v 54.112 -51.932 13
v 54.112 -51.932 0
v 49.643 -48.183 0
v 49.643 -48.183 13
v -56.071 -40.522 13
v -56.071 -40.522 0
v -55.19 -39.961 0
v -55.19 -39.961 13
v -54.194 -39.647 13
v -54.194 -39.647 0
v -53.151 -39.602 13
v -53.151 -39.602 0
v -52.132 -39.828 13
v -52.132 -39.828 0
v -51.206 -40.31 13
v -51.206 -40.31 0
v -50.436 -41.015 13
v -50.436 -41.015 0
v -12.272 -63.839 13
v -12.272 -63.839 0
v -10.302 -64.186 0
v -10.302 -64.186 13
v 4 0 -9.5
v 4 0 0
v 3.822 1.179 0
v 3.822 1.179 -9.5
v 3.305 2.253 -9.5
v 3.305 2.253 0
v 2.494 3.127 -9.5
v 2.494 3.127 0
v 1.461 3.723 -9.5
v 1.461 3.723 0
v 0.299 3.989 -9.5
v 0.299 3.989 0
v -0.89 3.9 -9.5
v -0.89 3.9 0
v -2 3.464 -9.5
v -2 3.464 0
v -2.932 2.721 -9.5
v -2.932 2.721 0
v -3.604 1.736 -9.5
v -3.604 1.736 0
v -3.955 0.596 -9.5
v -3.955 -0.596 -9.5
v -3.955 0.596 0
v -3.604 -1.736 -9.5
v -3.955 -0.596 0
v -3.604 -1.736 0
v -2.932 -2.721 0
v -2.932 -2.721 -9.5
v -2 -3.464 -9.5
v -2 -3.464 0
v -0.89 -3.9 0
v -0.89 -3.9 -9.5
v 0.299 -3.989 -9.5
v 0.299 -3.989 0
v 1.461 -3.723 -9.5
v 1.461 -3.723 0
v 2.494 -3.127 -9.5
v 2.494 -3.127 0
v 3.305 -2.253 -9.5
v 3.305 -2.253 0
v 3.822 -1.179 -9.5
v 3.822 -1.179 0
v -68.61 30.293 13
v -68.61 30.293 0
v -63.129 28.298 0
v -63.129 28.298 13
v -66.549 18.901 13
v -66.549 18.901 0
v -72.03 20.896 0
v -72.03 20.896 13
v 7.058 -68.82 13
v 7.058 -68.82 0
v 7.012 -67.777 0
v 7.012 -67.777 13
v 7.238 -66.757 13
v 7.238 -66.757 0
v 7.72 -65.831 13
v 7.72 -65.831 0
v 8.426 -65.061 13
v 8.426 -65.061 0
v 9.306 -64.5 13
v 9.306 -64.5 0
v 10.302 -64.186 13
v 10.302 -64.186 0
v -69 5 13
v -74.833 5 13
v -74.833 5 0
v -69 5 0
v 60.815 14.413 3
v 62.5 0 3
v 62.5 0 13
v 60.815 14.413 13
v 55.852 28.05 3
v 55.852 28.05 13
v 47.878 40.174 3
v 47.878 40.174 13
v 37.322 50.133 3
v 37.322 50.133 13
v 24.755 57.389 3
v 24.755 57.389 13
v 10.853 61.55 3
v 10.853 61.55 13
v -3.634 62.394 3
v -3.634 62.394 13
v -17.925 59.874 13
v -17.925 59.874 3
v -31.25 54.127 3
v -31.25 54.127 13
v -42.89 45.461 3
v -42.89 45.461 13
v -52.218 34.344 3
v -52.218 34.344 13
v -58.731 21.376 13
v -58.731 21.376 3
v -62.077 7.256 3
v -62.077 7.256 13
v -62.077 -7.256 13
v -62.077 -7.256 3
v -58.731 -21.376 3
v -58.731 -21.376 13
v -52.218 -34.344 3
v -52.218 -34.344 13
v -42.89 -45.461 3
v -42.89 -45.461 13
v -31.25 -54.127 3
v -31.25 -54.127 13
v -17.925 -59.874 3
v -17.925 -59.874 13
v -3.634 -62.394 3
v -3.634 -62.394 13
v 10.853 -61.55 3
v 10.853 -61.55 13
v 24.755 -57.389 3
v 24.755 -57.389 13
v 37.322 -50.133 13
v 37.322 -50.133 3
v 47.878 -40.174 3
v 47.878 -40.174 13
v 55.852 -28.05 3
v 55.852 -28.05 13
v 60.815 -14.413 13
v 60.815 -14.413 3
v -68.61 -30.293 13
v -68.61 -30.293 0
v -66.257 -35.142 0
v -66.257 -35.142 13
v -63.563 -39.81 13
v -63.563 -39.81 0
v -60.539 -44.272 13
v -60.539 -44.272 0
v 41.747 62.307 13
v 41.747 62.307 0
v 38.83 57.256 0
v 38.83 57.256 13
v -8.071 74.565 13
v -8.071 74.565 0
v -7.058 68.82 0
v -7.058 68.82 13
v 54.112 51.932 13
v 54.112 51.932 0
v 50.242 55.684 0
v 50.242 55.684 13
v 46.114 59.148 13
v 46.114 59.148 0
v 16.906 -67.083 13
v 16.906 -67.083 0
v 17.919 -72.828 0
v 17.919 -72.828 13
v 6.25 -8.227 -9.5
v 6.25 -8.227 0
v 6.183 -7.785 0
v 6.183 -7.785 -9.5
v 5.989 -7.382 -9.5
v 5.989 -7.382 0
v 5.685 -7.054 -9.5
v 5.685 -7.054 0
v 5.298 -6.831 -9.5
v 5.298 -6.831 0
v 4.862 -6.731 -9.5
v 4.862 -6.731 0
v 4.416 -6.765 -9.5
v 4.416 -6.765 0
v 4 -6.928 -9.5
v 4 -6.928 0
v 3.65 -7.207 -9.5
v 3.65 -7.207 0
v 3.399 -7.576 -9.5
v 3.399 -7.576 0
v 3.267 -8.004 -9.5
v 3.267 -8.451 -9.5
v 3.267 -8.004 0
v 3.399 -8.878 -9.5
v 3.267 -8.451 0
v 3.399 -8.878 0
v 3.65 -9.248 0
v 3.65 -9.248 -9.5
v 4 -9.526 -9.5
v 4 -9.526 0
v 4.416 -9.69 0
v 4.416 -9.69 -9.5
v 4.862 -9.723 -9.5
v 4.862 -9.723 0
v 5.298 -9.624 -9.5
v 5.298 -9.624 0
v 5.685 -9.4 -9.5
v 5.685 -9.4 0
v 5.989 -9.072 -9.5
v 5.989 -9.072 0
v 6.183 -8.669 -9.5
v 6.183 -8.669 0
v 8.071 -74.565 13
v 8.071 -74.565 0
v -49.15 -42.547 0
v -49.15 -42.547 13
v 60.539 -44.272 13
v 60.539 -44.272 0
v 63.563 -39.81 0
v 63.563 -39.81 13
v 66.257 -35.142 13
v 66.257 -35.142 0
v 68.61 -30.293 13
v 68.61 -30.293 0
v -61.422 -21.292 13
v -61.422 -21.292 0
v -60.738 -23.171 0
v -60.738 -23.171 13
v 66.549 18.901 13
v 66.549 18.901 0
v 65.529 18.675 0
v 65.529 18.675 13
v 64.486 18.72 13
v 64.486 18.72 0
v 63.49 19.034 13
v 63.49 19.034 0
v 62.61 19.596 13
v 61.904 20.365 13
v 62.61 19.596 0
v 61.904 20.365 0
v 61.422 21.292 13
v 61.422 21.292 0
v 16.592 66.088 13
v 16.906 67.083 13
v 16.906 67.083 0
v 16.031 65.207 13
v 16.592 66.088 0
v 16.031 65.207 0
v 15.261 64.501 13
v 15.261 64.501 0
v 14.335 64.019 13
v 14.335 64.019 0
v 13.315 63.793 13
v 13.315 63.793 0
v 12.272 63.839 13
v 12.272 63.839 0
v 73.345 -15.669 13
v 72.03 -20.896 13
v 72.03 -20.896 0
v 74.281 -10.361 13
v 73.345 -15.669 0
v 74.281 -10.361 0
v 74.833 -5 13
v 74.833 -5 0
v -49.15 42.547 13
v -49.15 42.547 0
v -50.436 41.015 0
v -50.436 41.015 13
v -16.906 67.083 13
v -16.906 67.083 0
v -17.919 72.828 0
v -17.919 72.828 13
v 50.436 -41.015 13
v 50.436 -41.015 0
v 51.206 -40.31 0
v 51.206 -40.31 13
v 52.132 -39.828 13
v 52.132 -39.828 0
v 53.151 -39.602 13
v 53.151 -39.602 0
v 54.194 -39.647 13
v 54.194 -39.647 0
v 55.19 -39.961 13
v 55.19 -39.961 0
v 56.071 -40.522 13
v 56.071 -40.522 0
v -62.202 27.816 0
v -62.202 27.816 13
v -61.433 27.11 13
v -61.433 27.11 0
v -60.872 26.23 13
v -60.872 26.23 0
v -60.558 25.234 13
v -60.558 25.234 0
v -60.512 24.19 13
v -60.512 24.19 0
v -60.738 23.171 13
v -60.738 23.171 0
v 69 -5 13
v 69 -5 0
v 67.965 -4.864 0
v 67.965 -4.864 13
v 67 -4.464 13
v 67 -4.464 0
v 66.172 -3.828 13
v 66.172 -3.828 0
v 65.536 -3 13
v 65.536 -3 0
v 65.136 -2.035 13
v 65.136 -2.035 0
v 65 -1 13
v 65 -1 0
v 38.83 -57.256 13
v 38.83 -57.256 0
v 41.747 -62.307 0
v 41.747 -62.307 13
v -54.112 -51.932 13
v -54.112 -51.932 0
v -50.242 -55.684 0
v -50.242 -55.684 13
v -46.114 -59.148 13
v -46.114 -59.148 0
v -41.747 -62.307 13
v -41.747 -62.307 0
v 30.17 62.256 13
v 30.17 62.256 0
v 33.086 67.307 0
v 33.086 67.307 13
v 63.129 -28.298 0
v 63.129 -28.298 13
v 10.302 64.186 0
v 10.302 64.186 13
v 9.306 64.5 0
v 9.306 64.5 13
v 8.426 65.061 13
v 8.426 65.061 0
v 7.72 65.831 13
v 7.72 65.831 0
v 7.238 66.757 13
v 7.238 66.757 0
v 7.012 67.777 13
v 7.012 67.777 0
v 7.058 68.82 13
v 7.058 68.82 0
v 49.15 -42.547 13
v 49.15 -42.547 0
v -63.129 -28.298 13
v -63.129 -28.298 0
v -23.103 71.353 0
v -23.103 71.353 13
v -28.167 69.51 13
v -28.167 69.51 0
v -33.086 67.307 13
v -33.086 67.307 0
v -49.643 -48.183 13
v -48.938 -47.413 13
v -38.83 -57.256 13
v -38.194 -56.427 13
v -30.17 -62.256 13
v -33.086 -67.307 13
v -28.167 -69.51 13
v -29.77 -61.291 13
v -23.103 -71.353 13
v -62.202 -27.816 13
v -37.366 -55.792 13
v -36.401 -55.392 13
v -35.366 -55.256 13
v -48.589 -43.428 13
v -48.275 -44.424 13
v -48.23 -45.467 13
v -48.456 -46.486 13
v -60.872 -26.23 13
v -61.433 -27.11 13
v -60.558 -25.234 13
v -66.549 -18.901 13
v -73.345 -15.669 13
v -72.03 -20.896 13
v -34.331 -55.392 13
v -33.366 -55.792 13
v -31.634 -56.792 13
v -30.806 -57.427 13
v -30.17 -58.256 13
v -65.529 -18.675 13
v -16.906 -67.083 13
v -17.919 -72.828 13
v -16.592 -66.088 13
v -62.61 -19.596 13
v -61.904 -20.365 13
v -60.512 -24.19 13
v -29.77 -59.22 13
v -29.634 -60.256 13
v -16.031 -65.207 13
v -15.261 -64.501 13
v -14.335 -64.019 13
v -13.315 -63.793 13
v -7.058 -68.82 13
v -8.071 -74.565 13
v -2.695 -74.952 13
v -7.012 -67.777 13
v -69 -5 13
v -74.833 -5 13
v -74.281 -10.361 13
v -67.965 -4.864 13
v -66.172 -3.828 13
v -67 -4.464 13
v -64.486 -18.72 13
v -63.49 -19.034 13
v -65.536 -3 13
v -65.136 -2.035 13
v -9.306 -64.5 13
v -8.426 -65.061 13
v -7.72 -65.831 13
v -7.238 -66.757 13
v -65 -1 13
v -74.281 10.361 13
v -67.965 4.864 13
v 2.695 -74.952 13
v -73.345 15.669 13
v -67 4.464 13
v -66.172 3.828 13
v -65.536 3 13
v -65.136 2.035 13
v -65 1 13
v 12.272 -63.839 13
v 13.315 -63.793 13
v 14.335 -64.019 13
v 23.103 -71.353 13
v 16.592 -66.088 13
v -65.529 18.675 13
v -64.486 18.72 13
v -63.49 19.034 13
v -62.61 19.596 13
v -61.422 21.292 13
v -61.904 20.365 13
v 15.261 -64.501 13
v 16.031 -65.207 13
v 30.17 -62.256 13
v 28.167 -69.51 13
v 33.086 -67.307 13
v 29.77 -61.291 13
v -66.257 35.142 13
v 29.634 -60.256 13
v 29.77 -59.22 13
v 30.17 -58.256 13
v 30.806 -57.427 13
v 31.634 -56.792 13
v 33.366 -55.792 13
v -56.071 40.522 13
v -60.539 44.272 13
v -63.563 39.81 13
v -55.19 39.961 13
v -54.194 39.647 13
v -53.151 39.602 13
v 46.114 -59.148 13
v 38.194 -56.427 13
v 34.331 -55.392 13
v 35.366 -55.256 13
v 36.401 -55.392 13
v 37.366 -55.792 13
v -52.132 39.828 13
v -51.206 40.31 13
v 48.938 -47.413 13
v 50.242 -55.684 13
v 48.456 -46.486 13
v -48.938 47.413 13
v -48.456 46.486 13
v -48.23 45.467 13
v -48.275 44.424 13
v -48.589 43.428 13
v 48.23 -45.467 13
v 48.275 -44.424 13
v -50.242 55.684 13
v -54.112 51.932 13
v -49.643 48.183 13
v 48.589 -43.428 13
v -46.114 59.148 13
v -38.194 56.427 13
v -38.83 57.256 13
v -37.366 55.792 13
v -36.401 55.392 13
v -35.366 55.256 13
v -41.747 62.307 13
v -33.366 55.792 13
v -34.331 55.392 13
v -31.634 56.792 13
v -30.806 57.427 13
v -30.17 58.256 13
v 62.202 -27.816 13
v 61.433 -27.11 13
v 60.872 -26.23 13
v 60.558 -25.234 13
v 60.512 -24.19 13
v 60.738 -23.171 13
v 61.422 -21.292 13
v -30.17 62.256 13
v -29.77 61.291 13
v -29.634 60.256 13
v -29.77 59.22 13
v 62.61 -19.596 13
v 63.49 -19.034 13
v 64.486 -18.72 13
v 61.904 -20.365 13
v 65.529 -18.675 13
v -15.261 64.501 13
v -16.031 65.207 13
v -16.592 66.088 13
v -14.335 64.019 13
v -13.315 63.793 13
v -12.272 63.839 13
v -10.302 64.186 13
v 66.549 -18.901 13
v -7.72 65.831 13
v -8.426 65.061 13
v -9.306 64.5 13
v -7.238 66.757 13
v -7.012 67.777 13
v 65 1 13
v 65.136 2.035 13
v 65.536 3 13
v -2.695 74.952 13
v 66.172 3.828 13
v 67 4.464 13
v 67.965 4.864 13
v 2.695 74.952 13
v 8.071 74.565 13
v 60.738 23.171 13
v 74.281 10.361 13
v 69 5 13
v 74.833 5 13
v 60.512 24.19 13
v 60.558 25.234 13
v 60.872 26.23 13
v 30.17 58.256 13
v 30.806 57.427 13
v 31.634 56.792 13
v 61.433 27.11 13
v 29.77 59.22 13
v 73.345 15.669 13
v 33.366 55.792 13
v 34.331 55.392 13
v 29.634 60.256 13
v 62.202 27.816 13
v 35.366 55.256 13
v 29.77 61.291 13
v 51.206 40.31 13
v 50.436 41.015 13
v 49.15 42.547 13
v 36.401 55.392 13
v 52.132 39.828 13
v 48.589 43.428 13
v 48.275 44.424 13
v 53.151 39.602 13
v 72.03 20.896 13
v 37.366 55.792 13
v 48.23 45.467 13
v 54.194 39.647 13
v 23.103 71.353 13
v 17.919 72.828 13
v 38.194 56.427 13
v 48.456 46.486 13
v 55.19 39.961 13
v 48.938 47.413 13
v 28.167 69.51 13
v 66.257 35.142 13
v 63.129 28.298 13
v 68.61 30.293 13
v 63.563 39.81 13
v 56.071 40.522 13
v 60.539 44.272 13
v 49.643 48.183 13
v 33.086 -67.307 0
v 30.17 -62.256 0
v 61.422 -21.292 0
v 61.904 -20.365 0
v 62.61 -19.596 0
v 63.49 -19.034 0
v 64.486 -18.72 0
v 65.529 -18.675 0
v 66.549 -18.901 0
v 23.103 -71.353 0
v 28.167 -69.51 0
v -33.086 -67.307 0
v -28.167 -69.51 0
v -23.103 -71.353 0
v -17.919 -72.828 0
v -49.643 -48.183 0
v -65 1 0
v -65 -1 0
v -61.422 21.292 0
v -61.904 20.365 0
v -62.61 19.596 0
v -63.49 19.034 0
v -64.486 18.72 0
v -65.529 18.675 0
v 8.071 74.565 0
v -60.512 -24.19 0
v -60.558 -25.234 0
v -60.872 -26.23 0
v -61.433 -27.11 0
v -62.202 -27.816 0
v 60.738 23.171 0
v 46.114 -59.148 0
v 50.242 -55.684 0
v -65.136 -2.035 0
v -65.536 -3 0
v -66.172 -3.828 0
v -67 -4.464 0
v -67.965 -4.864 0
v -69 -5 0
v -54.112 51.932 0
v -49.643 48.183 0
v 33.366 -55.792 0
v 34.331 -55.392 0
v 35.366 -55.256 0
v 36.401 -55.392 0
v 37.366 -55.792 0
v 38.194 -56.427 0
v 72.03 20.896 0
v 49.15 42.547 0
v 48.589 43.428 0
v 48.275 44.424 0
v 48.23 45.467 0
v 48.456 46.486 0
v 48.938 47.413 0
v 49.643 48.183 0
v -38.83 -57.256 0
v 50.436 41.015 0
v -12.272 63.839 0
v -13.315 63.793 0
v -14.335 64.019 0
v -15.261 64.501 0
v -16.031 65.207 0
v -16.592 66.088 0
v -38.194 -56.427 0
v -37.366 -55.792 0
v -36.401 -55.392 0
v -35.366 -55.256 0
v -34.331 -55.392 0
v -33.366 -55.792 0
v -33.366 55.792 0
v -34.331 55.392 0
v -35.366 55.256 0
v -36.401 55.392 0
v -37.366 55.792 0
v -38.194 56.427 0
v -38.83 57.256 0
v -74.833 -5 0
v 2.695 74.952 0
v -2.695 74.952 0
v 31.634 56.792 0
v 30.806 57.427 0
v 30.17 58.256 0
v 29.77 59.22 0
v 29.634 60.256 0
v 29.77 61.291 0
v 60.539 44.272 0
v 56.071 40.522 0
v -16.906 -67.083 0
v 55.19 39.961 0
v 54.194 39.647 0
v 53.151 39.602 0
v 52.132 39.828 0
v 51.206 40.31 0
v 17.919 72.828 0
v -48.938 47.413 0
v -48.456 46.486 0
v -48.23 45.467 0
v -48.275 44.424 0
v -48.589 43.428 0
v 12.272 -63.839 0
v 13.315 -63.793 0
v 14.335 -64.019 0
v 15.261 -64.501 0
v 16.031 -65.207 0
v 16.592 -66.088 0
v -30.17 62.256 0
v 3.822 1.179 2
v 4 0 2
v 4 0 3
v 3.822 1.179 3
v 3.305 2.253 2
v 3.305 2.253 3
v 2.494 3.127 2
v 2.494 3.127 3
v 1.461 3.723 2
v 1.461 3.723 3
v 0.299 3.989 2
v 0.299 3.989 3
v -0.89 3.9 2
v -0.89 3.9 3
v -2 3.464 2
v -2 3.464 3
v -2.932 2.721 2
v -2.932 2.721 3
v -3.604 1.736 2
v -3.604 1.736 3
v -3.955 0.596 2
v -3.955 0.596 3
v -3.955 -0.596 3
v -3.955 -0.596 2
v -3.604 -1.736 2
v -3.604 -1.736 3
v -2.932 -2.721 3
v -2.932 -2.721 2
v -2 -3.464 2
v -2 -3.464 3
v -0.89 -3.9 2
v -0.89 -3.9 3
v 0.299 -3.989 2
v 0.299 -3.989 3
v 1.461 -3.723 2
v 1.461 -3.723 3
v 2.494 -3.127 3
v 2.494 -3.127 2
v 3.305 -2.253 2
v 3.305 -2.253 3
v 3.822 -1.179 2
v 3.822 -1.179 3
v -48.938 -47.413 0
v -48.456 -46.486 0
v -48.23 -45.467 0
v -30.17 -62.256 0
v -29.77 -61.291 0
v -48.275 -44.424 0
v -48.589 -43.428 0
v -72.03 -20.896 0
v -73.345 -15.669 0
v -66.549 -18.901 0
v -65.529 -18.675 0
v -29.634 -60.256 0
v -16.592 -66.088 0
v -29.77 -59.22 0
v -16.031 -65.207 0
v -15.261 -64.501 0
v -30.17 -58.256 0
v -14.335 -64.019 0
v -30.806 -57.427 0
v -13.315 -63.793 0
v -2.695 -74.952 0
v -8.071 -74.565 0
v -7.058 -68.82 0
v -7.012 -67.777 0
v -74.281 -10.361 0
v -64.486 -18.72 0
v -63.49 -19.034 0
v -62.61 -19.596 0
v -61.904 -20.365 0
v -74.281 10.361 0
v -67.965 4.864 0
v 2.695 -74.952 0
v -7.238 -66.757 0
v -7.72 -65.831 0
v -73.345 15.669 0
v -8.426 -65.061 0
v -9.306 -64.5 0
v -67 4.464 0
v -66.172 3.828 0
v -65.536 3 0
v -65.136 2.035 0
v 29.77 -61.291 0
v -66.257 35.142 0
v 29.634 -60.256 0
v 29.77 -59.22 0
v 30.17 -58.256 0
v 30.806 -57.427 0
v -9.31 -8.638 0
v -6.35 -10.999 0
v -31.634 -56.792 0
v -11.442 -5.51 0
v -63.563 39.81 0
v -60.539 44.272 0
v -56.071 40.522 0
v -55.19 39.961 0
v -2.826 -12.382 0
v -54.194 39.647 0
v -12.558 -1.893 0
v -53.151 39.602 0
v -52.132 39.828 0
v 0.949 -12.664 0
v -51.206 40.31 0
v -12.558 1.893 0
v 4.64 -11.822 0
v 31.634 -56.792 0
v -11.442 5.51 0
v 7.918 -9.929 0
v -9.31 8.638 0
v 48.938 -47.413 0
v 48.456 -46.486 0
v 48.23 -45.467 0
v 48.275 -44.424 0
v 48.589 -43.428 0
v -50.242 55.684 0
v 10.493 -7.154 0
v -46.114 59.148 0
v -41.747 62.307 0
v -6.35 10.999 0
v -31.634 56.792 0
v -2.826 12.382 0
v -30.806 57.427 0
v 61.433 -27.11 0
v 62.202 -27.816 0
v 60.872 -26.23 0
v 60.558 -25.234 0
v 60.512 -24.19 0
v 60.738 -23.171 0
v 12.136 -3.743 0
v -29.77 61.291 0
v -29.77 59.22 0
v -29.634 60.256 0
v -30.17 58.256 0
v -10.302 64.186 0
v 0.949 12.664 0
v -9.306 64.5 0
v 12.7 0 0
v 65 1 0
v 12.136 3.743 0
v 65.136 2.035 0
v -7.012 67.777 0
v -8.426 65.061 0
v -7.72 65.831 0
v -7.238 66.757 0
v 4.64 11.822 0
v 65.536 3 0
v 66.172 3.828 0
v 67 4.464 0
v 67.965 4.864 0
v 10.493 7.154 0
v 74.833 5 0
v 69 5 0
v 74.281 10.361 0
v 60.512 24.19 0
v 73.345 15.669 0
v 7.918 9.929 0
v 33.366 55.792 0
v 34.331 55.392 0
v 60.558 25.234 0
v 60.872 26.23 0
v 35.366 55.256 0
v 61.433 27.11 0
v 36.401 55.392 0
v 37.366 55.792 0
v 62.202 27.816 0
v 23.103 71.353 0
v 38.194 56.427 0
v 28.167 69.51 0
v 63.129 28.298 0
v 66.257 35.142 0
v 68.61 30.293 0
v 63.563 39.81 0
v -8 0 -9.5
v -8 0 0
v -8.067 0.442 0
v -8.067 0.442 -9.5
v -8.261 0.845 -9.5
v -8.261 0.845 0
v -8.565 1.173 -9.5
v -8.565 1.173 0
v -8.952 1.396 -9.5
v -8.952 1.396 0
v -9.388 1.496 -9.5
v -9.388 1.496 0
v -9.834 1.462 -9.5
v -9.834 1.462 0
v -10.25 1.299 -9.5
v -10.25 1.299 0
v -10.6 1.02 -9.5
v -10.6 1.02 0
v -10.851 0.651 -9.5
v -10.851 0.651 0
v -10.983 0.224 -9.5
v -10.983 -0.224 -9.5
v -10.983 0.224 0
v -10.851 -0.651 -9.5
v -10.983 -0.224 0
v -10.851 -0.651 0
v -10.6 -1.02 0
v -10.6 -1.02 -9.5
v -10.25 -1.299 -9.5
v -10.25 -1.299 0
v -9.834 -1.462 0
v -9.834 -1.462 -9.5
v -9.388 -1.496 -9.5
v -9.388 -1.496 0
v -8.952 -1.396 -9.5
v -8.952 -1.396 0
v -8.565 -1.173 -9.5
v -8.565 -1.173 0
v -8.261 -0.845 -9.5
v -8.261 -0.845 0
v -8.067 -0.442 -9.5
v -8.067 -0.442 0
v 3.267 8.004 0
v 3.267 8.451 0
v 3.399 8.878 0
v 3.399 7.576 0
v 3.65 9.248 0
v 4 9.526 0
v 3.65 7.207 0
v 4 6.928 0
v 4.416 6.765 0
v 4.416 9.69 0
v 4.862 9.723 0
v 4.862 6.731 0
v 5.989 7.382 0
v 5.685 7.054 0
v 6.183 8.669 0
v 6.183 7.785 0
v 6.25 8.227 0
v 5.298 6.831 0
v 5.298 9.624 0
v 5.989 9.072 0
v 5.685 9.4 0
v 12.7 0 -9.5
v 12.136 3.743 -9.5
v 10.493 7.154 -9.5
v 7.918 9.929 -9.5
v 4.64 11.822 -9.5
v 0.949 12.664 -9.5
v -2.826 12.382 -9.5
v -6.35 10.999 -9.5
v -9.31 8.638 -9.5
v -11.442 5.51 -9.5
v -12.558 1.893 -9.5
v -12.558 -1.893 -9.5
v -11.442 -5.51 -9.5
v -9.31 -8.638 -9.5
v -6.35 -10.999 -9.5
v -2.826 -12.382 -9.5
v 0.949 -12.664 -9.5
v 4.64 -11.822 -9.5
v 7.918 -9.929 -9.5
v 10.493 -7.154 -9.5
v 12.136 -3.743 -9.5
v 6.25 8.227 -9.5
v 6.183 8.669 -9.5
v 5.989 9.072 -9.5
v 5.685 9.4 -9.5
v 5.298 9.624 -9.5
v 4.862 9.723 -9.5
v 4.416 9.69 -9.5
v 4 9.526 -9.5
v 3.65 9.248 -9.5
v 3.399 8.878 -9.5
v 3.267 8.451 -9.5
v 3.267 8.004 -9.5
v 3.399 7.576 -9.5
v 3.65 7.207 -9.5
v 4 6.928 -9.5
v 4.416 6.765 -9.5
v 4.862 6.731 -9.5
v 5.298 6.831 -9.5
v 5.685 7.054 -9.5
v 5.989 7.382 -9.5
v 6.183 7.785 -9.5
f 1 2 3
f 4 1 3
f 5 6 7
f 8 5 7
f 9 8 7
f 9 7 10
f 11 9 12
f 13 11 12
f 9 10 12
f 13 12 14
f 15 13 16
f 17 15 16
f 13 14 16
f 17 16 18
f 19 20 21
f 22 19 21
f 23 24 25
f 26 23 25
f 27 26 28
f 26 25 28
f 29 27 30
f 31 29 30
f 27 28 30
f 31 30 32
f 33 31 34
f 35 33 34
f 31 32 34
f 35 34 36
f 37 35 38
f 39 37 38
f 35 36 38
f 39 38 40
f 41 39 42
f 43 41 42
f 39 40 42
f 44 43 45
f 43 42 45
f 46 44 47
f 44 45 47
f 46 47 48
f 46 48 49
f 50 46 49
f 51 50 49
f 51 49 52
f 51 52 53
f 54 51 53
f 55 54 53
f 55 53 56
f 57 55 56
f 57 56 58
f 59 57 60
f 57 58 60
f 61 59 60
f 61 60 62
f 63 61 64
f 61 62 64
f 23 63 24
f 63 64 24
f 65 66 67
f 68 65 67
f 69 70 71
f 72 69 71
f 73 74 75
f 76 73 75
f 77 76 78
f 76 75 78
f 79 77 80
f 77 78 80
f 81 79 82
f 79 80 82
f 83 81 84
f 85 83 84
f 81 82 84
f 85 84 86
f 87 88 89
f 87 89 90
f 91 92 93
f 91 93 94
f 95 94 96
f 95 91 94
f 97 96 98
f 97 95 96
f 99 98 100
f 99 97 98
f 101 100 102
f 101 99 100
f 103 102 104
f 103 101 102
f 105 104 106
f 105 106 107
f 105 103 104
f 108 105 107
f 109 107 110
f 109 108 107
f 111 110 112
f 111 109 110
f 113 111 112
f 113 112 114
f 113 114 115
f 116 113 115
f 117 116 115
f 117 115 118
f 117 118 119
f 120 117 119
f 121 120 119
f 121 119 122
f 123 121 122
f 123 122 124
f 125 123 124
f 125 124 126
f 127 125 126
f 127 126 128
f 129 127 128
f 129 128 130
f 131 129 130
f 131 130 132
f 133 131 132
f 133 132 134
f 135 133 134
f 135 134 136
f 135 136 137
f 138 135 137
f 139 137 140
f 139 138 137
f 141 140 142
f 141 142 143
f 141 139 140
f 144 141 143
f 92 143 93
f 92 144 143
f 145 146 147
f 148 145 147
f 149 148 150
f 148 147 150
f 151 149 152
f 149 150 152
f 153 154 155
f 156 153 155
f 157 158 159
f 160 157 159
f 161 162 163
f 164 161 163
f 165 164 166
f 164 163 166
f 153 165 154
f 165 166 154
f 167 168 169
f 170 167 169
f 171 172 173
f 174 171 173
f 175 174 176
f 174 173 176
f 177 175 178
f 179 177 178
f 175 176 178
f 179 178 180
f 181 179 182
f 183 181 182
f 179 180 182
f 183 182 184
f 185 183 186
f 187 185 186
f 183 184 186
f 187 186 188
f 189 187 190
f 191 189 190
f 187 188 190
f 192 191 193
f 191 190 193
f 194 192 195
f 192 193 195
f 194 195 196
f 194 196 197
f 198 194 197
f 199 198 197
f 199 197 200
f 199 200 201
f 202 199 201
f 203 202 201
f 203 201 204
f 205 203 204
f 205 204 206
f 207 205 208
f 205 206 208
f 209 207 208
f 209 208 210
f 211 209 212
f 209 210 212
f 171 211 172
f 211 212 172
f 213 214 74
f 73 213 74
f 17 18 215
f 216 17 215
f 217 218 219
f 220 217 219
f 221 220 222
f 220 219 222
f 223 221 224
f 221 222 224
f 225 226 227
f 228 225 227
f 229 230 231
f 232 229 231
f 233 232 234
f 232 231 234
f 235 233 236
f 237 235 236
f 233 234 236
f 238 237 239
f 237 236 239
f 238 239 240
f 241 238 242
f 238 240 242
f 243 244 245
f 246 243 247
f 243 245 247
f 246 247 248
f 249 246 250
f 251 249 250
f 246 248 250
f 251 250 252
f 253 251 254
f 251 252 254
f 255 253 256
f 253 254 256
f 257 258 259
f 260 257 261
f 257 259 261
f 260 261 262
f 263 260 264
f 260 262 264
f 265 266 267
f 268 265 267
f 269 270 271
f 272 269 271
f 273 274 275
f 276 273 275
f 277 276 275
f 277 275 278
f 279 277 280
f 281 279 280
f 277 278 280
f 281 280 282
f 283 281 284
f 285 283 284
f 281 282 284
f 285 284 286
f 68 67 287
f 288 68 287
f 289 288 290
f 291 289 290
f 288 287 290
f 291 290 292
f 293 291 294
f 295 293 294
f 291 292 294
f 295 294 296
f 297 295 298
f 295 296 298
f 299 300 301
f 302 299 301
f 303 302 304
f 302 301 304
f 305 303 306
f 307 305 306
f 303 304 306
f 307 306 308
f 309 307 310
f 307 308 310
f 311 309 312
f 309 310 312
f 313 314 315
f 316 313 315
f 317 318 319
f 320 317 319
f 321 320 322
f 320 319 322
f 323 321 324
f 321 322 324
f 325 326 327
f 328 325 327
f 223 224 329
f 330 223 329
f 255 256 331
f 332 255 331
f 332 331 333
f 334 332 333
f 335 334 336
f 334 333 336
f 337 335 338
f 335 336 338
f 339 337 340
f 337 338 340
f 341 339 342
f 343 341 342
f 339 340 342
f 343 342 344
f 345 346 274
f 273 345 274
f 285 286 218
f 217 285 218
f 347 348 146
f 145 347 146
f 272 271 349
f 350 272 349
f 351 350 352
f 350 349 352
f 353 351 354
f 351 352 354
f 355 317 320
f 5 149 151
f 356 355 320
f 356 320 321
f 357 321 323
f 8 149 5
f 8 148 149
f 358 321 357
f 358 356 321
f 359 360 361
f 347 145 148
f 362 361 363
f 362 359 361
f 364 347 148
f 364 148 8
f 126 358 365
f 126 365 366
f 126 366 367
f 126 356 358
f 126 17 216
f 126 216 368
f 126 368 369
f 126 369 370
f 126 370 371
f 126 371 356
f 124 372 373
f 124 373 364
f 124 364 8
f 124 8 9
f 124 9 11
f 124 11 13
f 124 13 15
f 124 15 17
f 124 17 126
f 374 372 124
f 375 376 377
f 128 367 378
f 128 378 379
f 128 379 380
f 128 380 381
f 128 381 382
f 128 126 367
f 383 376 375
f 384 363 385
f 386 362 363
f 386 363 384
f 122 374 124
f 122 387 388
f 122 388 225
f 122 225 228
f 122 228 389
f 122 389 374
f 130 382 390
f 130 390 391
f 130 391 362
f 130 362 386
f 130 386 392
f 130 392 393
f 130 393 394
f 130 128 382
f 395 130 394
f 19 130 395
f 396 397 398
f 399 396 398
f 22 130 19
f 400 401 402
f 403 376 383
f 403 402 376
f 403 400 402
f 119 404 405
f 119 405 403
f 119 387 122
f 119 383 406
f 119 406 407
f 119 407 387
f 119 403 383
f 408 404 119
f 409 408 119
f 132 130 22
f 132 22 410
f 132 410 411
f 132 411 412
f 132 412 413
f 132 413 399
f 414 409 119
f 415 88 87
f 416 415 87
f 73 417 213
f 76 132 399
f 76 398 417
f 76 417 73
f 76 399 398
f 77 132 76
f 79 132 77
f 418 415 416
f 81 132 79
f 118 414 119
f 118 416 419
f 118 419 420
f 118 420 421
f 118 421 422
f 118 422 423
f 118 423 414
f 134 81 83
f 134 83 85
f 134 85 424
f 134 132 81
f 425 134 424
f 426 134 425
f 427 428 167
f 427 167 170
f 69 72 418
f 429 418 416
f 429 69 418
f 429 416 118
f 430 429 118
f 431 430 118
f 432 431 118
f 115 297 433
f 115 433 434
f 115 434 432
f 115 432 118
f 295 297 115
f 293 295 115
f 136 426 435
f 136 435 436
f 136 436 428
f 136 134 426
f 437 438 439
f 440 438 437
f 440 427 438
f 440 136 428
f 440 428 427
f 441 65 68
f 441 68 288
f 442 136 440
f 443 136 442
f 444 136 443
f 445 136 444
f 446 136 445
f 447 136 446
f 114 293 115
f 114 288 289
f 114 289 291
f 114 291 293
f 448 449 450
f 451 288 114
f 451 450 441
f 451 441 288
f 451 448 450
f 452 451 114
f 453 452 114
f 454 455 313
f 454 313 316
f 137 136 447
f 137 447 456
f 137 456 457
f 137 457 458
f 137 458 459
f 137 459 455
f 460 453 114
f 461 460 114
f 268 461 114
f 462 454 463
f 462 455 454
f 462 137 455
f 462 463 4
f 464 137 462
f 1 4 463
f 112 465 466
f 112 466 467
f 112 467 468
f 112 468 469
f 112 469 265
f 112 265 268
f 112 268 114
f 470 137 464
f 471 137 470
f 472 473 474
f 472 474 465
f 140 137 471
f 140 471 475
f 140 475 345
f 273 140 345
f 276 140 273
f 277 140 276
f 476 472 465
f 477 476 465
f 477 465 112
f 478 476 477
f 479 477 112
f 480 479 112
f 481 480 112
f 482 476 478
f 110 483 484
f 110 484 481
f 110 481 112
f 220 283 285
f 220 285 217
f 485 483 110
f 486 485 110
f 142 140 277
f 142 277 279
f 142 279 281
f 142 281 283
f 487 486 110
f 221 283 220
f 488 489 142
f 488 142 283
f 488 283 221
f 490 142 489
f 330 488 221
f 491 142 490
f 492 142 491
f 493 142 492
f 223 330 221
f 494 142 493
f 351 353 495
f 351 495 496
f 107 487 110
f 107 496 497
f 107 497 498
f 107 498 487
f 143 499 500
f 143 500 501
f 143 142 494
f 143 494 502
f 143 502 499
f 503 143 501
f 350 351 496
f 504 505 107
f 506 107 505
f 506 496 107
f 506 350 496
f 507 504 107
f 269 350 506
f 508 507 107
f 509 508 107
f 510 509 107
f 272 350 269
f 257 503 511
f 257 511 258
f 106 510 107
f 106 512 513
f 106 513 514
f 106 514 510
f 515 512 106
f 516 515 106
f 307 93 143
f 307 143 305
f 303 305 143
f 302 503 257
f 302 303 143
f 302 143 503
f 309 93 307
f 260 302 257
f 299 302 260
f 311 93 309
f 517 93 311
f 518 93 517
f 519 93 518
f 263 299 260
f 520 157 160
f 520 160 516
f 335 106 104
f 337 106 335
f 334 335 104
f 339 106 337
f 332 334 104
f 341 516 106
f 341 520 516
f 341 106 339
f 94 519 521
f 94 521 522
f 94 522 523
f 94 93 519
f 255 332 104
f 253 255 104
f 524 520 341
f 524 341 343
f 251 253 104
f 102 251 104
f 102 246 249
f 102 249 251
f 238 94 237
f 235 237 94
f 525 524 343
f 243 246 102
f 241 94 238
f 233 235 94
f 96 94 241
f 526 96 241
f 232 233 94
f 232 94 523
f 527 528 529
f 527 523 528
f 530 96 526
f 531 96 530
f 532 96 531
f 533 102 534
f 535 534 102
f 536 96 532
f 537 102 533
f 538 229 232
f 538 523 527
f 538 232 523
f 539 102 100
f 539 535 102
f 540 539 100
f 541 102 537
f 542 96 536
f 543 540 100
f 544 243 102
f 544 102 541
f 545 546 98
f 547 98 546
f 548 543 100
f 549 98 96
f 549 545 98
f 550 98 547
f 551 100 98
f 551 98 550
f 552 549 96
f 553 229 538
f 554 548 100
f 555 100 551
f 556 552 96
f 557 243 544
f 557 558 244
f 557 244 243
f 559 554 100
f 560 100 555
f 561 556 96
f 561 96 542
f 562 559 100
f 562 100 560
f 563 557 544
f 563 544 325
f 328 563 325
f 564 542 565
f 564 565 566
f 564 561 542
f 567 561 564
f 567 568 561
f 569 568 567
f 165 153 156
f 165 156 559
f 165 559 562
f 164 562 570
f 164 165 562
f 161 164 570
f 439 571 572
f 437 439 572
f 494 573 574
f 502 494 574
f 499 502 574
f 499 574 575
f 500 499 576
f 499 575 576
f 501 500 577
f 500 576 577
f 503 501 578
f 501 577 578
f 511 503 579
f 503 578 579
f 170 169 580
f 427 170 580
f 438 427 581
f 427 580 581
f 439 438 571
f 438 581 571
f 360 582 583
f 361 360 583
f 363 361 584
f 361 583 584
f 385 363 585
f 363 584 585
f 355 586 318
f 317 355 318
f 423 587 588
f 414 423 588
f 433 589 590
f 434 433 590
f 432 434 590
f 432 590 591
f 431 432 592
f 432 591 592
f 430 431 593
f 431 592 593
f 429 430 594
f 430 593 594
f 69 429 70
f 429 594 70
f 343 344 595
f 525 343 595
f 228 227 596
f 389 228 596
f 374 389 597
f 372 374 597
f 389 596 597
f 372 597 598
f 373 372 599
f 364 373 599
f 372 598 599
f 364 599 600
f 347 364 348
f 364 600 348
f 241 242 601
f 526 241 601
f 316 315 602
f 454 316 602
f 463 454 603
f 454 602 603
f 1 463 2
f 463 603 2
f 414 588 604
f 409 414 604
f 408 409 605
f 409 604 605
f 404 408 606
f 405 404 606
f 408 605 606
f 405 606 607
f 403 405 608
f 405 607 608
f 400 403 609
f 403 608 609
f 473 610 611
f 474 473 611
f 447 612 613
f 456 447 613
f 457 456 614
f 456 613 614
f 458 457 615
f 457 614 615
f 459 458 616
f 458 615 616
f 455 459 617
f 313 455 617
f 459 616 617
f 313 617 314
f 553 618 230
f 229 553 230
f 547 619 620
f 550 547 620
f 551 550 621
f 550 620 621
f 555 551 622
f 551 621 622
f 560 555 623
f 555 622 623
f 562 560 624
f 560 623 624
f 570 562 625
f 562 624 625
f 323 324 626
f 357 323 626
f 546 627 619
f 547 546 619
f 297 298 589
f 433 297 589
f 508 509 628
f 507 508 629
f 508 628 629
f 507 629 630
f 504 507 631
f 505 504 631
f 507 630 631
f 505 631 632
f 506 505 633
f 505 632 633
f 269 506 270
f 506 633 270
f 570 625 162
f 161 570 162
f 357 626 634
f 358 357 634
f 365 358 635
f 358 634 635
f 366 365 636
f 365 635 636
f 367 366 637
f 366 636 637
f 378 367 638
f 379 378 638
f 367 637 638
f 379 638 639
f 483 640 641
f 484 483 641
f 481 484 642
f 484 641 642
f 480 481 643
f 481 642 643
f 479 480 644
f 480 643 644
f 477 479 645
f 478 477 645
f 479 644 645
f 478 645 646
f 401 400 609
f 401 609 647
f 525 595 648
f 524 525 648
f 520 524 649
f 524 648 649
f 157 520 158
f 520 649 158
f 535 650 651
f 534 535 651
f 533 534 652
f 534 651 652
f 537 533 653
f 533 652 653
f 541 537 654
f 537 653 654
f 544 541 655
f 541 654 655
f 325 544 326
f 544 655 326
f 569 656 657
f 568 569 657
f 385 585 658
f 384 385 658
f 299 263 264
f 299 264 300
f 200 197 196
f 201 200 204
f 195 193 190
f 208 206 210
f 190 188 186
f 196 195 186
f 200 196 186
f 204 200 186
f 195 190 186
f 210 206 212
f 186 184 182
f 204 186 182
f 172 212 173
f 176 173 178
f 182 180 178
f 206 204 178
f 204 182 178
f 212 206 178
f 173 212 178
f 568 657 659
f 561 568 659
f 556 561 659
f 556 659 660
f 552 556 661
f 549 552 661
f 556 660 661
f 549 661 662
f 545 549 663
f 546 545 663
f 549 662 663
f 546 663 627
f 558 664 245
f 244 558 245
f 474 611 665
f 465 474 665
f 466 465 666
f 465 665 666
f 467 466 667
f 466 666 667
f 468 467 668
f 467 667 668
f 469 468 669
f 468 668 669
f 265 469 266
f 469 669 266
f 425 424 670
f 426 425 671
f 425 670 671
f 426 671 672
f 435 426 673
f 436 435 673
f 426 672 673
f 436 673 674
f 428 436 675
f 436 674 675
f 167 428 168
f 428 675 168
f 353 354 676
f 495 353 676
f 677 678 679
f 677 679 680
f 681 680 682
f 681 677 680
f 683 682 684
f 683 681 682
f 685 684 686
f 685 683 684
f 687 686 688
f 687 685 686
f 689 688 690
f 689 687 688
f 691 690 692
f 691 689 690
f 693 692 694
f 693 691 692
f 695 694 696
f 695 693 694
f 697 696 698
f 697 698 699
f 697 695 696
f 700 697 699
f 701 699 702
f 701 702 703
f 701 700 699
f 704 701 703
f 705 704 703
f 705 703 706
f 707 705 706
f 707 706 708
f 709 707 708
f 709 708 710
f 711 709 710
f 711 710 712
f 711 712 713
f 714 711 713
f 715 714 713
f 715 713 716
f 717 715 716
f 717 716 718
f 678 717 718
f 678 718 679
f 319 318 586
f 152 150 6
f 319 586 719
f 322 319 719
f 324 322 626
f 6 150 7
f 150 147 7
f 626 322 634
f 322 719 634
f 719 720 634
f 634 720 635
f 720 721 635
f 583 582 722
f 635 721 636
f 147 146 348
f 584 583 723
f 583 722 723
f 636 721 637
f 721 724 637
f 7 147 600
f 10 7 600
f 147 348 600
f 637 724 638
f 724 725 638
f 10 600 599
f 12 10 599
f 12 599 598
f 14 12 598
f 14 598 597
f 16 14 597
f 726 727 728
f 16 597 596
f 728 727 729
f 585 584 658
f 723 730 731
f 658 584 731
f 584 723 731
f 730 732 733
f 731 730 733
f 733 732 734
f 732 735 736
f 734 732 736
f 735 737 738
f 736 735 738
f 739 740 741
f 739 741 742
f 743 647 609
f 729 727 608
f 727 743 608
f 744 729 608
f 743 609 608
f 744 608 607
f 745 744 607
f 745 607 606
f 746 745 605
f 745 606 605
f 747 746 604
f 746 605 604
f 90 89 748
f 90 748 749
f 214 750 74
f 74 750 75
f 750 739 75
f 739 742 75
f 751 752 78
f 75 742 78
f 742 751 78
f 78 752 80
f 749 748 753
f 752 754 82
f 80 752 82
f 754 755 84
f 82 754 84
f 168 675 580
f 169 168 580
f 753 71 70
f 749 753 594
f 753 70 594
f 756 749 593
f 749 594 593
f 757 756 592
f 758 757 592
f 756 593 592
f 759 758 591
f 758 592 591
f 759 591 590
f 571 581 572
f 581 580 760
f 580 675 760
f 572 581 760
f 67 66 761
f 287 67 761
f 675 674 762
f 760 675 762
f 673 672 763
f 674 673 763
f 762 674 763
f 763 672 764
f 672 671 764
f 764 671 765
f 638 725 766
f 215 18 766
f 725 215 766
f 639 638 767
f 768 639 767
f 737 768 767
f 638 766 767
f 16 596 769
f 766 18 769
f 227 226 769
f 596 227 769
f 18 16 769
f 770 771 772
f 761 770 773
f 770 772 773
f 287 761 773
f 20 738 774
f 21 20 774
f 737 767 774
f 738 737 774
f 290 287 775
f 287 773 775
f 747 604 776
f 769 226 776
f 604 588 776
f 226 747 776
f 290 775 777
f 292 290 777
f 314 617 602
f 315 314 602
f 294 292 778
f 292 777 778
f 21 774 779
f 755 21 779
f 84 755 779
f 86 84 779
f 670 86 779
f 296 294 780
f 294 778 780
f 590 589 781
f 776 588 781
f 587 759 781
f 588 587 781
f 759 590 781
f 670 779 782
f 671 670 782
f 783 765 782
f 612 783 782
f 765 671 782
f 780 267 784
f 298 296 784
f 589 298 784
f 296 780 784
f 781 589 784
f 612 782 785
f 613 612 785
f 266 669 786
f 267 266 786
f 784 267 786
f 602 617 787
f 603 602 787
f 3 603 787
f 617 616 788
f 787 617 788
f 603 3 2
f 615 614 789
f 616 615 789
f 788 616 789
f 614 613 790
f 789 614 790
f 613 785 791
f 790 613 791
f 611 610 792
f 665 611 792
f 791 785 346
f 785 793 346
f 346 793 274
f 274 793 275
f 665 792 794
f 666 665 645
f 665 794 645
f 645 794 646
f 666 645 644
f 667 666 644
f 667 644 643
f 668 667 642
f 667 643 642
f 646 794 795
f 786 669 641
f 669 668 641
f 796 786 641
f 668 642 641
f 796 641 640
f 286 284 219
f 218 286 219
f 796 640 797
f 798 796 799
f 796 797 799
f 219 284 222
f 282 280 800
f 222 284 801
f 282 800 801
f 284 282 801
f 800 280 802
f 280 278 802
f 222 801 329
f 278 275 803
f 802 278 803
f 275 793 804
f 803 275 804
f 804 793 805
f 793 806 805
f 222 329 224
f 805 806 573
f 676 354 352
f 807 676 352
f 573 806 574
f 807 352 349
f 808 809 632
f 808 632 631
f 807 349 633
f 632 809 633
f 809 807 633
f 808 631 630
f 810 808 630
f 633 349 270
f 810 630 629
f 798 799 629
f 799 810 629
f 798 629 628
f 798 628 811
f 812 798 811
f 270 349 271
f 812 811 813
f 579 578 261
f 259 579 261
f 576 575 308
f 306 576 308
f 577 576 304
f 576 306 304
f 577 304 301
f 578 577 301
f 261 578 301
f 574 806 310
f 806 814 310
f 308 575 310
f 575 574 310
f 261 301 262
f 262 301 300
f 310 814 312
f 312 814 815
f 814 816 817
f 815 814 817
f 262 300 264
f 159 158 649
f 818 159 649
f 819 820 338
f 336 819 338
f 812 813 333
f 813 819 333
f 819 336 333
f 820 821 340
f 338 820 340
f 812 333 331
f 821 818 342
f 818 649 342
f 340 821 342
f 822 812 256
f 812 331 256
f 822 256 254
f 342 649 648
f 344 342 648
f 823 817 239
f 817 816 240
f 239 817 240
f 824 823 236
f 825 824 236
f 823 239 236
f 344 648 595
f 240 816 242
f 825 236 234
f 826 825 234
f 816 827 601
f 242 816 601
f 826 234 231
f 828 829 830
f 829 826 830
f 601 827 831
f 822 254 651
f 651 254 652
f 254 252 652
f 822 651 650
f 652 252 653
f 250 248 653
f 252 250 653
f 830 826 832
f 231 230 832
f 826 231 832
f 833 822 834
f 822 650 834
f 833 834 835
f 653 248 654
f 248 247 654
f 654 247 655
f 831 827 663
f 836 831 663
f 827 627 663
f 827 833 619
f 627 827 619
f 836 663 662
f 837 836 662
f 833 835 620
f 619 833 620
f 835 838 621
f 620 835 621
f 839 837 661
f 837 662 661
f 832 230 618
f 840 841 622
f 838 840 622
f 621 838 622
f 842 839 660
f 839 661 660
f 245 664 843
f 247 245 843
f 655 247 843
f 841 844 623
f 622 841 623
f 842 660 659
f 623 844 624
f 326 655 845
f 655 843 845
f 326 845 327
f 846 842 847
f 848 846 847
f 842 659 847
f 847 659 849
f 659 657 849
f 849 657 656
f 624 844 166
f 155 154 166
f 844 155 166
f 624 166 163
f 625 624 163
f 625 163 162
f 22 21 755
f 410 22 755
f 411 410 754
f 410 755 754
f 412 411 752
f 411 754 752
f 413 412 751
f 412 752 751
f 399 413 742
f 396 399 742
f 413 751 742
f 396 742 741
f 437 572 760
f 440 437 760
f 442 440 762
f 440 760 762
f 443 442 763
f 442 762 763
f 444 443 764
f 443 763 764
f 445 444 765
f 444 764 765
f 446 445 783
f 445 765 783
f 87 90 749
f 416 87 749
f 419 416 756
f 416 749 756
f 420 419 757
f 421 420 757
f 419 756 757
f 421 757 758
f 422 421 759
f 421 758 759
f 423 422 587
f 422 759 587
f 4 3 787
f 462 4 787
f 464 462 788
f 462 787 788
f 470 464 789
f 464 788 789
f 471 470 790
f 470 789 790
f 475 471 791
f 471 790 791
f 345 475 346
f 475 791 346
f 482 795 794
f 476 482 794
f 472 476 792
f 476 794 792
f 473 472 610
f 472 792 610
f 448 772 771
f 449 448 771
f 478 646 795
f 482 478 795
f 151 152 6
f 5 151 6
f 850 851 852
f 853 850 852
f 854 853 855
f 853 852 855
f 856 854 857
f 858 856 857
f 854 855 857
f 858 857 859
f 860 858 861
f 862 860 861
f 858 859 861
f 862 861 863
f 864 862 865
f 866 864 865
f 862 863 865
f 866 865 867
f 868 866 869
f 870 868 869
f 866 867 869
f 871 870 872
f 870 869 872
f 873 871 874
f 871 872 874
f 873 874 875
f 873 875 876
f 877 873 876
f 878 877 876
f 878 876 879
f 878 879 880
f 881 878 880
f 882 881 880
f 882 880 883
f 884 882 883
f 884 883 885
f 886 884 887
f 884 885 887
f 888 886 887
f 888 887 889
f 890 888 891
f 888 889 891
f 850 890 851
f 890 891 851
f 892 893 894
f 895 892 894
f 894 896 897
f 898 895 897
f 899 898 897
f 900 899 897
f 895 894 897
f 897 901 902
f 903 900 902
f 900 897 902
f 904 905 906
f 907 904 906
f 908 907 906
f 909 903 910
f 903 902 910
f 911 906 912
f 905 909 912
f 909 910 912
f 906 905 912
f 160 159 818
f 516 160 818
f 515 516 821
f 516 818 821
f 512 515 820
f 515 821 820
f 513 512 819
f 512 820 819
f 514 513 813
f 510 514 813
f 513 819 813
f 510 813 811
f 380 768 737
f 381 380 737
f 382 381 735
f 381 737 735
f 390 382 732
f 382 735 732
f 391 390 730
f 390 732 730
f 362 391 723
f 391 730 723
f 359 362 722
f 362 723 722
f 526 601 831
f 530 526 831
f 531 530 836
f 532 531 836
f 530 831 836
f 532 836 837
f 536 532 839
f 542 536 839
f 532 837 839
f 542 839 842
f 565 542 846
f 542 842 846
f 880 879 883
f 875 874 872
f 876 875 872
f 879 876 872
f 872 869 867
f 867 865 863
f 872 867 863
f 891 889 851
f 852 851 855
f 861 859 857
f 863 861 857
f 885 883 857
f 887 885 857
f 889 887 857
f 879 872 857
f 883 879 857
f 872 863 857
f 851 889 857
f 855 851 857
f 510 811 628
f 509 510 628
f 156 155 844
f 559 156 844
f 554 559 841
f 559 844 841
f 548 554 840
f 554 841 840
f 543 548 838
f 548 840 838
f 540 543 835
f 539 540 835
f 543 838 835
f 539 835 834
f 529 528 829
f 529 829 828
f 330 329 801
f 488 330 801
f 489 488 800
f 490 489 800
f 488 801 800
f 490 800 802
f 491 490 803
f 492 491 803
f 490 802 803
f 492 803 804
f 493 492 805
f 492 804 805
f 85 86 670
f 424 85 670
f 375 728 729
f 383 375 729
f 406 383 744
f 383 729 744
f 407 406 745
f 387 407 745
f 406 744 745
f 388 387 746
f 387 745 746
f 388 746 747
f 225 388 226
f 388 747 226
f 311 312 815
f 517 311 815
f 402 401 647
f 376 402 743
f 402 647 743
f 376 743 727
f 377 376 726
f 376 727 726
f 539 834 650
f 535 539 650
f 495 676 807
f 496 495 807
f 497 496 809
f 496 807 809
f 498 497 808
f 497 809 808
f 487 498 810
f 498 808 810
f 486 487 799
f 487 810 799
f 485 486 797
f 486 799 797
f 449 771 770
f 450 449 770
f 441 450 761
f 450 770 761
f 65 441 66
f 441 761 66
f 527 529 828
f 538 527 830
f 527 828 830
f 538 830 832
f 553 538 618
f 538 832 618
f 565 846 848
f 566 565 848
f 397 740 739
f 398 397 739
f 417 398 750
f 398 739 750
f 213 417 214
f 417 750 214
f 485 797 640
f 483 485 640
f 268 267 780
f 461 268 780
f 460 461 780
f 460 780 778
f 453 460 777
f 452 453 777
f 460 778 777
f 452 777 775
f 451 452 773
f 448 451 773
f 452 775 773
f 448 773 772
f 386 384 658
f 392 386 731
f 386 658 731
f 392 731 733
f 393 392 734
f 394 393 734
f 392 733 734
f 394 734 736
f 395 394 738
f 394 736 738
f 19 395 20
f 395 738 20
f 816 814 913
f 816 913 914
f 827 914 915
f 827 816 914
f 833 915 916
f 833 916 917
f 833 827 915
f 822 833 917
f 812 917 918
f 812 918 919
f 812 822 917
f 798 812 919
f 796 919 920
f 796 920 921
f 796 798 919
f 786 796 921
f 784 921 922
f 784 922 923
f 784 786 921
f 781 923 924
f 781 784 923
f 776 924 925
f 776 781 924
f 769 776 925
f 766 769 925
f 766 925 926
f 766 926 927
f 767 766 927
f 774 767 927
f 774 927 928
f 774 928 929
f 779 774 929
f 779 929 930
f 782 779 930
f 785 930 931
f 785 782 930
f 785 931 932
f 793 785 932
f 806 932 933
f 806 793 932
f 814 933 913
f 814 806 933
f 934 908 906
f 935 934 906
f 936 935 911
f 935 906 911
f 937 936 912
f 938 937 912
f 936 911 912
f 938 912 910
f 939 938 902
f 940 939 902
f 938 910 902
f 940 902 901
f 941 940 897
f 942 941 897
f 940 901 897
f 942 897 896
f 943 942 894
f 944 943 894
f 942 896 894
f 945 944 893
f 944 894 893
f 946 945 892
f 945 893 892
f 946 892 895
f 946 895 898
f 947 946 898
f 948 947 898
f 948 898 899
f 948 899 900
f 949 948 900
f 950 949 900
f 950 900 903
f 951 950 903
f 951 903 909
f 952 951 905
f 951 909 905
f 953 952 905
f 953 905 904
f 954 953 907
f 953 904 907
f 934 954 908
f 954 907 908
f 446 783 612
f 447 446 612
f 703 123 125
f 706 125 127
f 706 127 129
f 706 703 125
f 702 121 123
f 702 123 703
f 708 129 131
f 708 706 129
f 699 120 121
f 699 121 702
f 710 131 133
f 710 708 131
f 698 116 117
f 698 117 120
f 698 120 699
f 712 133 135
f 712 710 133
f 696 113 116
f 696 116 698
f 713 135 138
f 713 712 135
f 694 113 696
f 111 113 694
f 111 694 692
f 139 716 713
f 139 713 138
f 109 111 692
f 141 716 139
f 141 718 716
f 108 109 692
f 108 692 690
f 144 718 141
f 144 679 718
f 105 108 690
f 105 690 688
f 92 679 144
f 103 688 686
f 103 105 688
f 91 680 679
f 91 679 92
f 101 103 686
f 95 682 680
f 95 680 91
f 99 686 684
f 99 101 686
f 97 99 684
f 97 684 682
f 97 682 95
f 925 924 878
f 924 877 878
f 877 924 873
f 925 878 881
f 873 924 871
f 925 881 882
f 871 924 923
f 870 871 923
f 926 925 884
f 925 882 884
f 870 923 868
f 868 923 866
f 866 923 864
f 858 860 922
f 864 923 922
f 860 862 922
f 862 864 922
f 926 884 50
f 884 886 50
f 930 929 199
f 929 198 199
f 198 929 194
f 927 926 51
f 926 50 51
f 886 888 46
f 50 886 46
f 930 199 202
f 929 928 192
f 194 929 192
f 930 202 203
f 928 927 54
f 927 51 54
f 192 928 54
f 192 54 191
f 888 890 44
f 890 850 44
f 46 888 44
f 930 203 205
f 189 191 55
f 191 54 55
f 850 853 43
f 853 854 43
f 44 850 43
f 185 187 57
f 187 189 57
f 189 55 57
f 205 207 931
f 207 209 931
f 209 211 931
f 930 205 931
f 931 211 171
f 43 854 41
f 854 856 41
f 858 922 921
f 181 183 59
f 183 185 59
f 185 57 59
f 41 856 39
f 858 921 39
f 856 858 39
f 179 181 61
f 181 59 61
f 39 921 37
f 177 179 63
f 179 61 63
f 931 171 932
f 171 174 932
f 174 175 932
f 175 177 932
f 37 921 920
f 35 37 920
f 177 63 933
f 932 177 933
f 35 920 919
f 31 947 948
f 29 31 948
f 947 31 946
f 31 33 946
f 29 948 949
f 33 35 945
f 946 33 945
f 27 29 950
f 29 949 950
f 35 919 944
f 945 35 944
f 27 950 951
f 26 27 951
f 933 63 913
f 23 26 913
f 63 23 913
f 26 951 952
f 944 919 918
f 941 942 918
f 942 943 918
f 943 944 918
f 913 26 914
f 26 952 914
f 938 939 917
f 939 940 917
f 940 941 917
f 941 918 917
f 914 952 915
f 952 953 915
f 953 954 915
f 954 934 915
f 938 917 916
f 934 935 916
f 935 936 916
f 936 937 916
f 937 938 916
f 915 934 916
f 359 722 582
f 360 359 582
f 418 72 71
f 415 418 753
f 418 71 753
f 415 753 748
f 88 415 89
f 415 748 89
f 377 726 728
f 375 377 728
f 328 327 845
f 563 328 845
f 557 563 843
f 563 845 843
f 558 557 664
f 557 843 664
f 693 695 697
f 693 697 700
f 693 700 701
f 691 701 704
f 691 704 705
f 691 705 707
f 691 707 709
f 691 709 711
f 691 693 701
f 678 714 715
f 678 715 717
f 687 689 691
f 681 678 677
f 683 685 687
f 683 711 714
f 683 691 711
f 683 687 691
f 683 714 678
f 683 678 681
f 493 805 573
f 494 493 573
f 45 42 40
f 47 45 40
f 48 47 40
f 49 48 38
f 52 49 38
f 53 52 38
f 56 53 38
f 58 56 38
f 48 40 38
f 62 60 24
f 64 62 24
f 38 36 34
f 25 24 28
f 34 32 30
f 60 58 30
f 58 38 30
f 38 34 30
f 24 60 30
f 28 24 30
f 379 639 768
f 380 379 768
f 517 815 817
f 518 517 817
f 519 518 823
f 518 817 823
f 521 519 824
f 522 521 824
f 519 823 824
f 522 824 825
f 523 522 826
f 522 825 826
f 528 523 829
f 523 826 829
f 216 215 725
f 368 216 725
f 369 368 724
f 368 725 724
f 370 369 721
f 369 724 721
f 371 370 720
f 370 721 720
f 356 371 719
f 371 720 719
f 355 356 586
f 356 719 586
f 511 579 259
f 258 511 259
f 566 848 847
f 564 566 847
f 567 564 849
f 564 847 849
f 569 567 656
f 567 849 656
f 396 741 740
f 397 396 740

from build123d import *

# Parameters (mm, degrees)
F0_R     = 62.5
F0_R_2   = 12.7
F0_R_3   = 1.5
F0_R_4   = 4
F1_DEPTH = 3
F2_DEPTH = 13
F3_DEPTH = 9.5
F4_DEPTH = 2


with BuildPart() as f1:
    # F0 (on Top) → F1 (new body)
    with BuildSketch(Plane.XY):
        Circle(F0_R)
        Circle(F0_R_2, mode=Mode.SUBTRACT)
        Circle(F0_R_2)
        with Locations((-4.75, -8.227241)):
            Circle(F0_R_3, mode=Mode.SUBTRACT)
        with Locations((4.75, -8.227241)):
            Circle(F0_R_3, mode=Mode.SUBTRACT)
        with Locations((-9.5, 0)):
            Circle(F0_R_3, mode=Mode.SUBTRACT)
        with Locations((-4.75, 8.227241)):
            Circle(F0_R_3, mode=Mode.SUBTRACT)
        Circle(F0_R_4, mode=Mode.SUBTRACT)
        with Locations((4.75, 8.227241)):
            Circle(F0_R_3, mode=Mode.SUBTRACT)
        with Locations((9.5, 0)):
            Circle(F0_R_3, mode=Mode.SUBTRACT)
        with Locations((9.5, 0)):
            Circle(F0_R_3)
        with Locations((4.75, 8.227241)):
            Circle(F0_R_3)
        with Locations((-4.75, 8.227241)):
            Circle(F0_R_3)
        with Locations((-9.5, 0)):
            Circle(F0_R_3)
        with Locations((-4.75, -8.227241)):
            Circle(F0_R_3)
        with Locations((4.75, -8.227241)):
            Circle(F0_R_3)
    extrude(amount=F1_DEPTH)

    # F0 (on Top) → F2 (join)
    with BuildSketch(Plane.XY):
        with BuildLine():
            Line((69, 5), (74.833148, 5))
            ThreePointArc((74.833148, 5), (73.860581, 13.023613), (72.030257, 20.895981))
            Line((72.030257, 20.895981), (66.548892, 18.900927))
            ThreePointArc((66.548892, 18.900927), (63.490338, 19.034466), (61.42204, 21.291617))
            Line((61.42204, 21.291617), (60.738, 23.171002))
            ThreePointArc((60.738, 23.171002), (60.87154, 26.229556), (63.12869, 28.297853))
            Line((63.12869, 28.297853), (68.610056, 30.292907))
            ThreePointArc((68.610056, 30.292907), (64.951905, 37.5), (60.539455, 44.271598))
            Line((60.539455, 44.271598), (56.071005, 40.522123))
            ThreePointArc((56.071005, 40.522123), (53.151231, 39.601522), (50.435676, 41.01515))
            Line((50.435676, 41.01515), (49.150101, 42.547239))
            ThreePointArc((49.150101, 42.547239), (48.2295, 45.467012), (49.643129, 48.182567))
            Line((49.643129, 48.182567), (54.111579, 51.932042))
            ThreePointArc((54.111579, 51.932042), (48.209071, 57.453333), (41.746701, 62.307407))
            Line((41.746701, 62.307407), (38.830127, 57.255753))
            ThreePointArc((38.830127, 57.255753), (36.401302, 55.39205), (33.366025, 55.791651))
            Line((33.366025, 55.791651), (31.633975, 56.791651))
            ThreePointArc((31.633975, 56.791651), (29.770271, 59.220477), (30.169873, 62.255753))
            Line((30.169873, 62.255753), (33.086447, 67.307407))
            ThreePointArc((33.086447, 67.307407), (25.651511, 70.476947), (17.918678, 72.828023))
            Line((17.918678, 72.828023), (16.905763, 67.083494))
            ThreePointArc((16.905763, 67.083494), (15.260838, 64.501479), (12.271939, 63.838856))
            Line((12.271939, 63.838856), (10.302324, 64.186152))
            ThreePointArc((10.302324, 64.186152), (7.720308, 65.831077), (7.057685, 68.819976))
            Line((7.057685, 68.819976), (8.070601, 74.564505))
            ThreePointArc((8.070601, 74.564505), (0, 75), (-8.070601, 74.564505))
            Line((-8.070601, 74.564505), (-7.057685, 68.819976))
            ThreePointArc((-7.057685, 68.819976), (-7.720308, 65.831077), (-10.302324, 64.186152))
            Line((-10.302324, 64.186152), (-12.271939, 63.838856))
            ThreePointArc((-12.271939, 63.838856), (-15.260838, 64.501479), (-16.905763, 67.083494))
            Line((-16.905763, 67.083494), (-17.918678, 72.828023))
            ThreePointArc((-17.918678, 72.828023), (-25.651511, 70.476947), (-33.086447, 67.307407))
            Line((-33.086447, 67.307407), (-30.169873, 62.255753))
            ThreePointArc((-30.169873, 62.255753), (-29.770271, 59.220477), (-31.633975, 56.791651))
            Line((-31.633975, 56.791651), (-33.366025, 55.791651))
            ThreePointArc((-33.366025, 55.791651), (-36.401302, 55.39205), (-38.830127, 57.255753))
            Line((-38.830127, 57.255753), (-41.746701, 62.307407))
            ThreePointArc((-41.746701, 62.307407), (-48.209071, 57.453333), (-54.111579, 51.932042))
            Line((-54.111579, 51.932042), (-49.643129, 48.182567))
            ThreePointArc((-49.643129, 48.182567), (-48.2295, 45.467012), (-49.150101, 42.547239))
            Line((-49.150101, 42.547239), (-50.435676, 41.01515))
            ThreePointArc((-50.435676, 41.01515), (-53.151231, 39.601522), (-56.071005, 40.522123))
            Line((-56.071005, 40.522123), (-60.539455, 44.271598))
            ThreePointArc((-60.539455, 44.271598), (-64.951905, 37.5), (-68.610056, 30.292907))
            Line((-68.610056, 30.292907), (-63.12869, 28.297853))
            ThreePointArc((-63.12869, 28.297853), (-60.87154, 26.229556), (-60.738, 23.171002))
            Line((-60.738, 23.171002), (-61.42204, 21.291617))
            ThreePointArc((-61.42204, 21.291617), (-63.490338, 19.034466), (-66.548892, 18.900927))
            Line((-66.548892, 18.900927), (-72.030257, 20.895981))
            ThreePointArc((-72.030257, 20.895981), (-73.860581, 13.023613), (-74.833148, 5))
            Line((-74.833148, 5), (-69, 5))
            ThreePointArc((-69, 5), (-66.171573, 3.828427), (-65, 1))
            Line((-65, 1), (-65, -1))
            ThreePointArc((-65, -1), (-66.171573, -3.828427), (-69, -5))
            Line((-69, -5), (-74.833148, -5))
            ThreePointArc((-74.833148, -5), (-73.860581, -13.023613), (-72.030257, -20.895981))
            Line((-72.030257, -20.895981), (-66.548892, -18.900927))
            ThreePointArc((-66.548892, -18.900927), (-63.490338, -19.034466), (-61.42204, -21.291617))
            Line((-61.42204, -21.291617), (-60.738, -23.171002))
            ThreePointArc((-60.738, -23.171002), (-60.87154, -26.229556), (-63.12869, -28.297853))
            Line((-63.12869, -28.297853), (-68.610056, -30.292907))
            ThreePointArc((-68.610056, -30.292907), (-64.951905, -37.5), (-60.539455, -44.271598))
            Line((-60.539455, -44.271598), (-56.071005, -40.522123))
            ThreePointArc((-56.071005, -40.522123), (-53.151231, -39.601522), (-50.435676, -41.01515))
            Line((-50.435676, -41.01515), (-49.150101, -42.547239))
            ThreePointArc((-49.150101, -42.547239), (-48.2295, -45.467012), (-49.643129, -48.182567))
            Line((-49.643129, -48.182567), (-54.111579, -51.932042))
            ThreePointArc((-54.111579, -51.932042), (-48.209071, -57.453333), (-41.746701, -62.307407))
            Line((-41.746701, -62.307407), (-38.830127, -57.255753))
            ThreePointArc((-38.830127, -57.255753), (-36.401302, -55.39205), (-33.366025, -55.791651))
            Line((-33.366025, -55.791651), (-31.633975, -56.791651))
            ThreePointArc((-31.633975, -56.791651), (-29.770271, -59.220477), (-30.169873, -62.255753))
            Line((-30.169873, -62.255753), (-33.086447, -67.307407))
            ThreePointArc((-33.086447, -67.307407), (-25.651511, -70.476947), (-17.918678, -72.828023))
            Line((-17.918678, -72.828023), (-16.905763, -67.083494))
            ThreePointArc((-16.905763, -67.083494), (-15.260838, -64.501479), (-12.271939, -63.838856))
            Line((-12.271939, -63.838856), (-10.302324, -64.186152))
            ThreePointArc((-10.302324, -64.186152), (-7.720308, -65.831077), (-7.057685, -68.819976))
            Line((-7.057685, -68.819976), (-8.070601, -74.564505))
            ThreePointArc((-8.070601, -74.564505), (0, -75), (8.070601, -74.564505))
            Line((8.070601, -74.564505), (7.057685, -68.819976))
            ThreePointArc((7.057685, -68.819976), (7.720308, -65.831077), (10.302324, -64.186152))
            Line((10.302324, -64.186152), (12.271939, -63.838856))
            ThreePointArc((12.271939, -63.838856), (15.260838, -64.501479), (16.905763, -67.083494))
            Line((16.905763, -67.083494), (17.918678, -72.828023))
            ThreePointArc((17.918678, -72.828023), (25.651511, -70.476947), (33.086447, -67.307407))
            Line((33.086447, -67.307407), (30.169873, -62.255753))
            ThreePointArc((30.169873, -62.255753), (29.770271, -59.220477), (31.633975, -56.791651))
            Line((31.633975, -56.791651), (33.366025, -55.791651))
            ThreePointArc((33.366025, -55.791651), (36.401302, -55.39205), (38.830127, -57.255753))
            Line((38.830127, -57.255753), (41.746701, -62.307407))
            ThreePointArc((41.746701, -62.307407), (48.209071, -57.453333), (54.111579, -51.932042))
            Line((54.111579, -51.932042), (49.643129, -48.182567))
            ThreePointArc((49.643129, -48.182567), (48.2295, -45.467012), (49.150101, -42.547239))
            Line((49.150101, -42.547239), (50.435676, -41.01515))
            ThreePointArc((50.435676, -41.01515), (53.151231, -39.601522), (56.071005, -40.522123))
            Line((56.071005, -40.522123), (60.539455, -44.271598))
            ThreePointArc((60.539455, -44.271598), (64.951905, -37.5), (68.610056, -30.292907))
            Line((68.610056, -30.292907), (63.12869, -28.297853))
            ThreePointArc((63.12869, -28.297853), (60.87154, -26.229556), (60.738, -23.171002))
            Line((60.738, -23.171002), (61.42204, -21.291617))
            ThreePointArc((61.42204, -21.291617), (63.490338, -19.034466), (66.548892, -18.900927))
            Line((66.548892, -18.900927), (72.030257, -20.895981))
            ThreePointArc((72.030257, -20.895981), (73.860581, -13.023613), (74.833148, -5))
            Line((74.833148, -5), (69, -5))
            ThreePointArc((69, -5), (66.171573, -3.828427), (65, -1))
            Line((65, -1), (65, 1))
            ThreePointArc((65, 1), (66.171573, 3.828427), (69, 5))
        make_face()
        Circle(F0_R, mode=Mode.SUBTRACT)
    extrude(amount=F2_DEPTH)

    # F0 (on Top) → F3 (join)
    with BuildSketch(Plane.XY):
        Circle(F0_R_2)
        with Locations((-4.75, -8.227241)):
            Circle(F0_R_3, mode=Mode.SUBTRACT)
        with Locations((4.75, -8.227241)):
            Circle(F0_R_3, mode=Mode.SUBTRACT)
        with Locations((-9.5, 0)):
            Circle(F0_R_3, mode=Mode.SUBTRACT)
        with Locations((-4.75, 8.227241)):
            Circle(F0_R_3, mode=Mode.SUBTRACT)
        Circle(F0_R_4, mode=Mode.SUBTRACT)
        with Locations((4.75, 8.227241)):
            Circle(F0_R_3, mode=Mode.SUBTRACT)
        with Locations((9.5, 0)):
            Circle(F0_R_3, mode=Mode.SUBTRACT)
        with Locations((-4.75, 8.227241)):
            Circle(F0_R_3)
        with Locations((9.5, 0)):
            Circle(F0_R_3)
        with Locations((-4.75, -8.227241)):
            Circle(F0_R_3)
    extrude(amount=-F3_DEPTH)

    # F0 (on Top) → F4 (join)
    with BuildSketch(Plane.XY):
        Circle(F0_R_4)
    extrude(amount=F4_DEPTH)


solid = f1.part
